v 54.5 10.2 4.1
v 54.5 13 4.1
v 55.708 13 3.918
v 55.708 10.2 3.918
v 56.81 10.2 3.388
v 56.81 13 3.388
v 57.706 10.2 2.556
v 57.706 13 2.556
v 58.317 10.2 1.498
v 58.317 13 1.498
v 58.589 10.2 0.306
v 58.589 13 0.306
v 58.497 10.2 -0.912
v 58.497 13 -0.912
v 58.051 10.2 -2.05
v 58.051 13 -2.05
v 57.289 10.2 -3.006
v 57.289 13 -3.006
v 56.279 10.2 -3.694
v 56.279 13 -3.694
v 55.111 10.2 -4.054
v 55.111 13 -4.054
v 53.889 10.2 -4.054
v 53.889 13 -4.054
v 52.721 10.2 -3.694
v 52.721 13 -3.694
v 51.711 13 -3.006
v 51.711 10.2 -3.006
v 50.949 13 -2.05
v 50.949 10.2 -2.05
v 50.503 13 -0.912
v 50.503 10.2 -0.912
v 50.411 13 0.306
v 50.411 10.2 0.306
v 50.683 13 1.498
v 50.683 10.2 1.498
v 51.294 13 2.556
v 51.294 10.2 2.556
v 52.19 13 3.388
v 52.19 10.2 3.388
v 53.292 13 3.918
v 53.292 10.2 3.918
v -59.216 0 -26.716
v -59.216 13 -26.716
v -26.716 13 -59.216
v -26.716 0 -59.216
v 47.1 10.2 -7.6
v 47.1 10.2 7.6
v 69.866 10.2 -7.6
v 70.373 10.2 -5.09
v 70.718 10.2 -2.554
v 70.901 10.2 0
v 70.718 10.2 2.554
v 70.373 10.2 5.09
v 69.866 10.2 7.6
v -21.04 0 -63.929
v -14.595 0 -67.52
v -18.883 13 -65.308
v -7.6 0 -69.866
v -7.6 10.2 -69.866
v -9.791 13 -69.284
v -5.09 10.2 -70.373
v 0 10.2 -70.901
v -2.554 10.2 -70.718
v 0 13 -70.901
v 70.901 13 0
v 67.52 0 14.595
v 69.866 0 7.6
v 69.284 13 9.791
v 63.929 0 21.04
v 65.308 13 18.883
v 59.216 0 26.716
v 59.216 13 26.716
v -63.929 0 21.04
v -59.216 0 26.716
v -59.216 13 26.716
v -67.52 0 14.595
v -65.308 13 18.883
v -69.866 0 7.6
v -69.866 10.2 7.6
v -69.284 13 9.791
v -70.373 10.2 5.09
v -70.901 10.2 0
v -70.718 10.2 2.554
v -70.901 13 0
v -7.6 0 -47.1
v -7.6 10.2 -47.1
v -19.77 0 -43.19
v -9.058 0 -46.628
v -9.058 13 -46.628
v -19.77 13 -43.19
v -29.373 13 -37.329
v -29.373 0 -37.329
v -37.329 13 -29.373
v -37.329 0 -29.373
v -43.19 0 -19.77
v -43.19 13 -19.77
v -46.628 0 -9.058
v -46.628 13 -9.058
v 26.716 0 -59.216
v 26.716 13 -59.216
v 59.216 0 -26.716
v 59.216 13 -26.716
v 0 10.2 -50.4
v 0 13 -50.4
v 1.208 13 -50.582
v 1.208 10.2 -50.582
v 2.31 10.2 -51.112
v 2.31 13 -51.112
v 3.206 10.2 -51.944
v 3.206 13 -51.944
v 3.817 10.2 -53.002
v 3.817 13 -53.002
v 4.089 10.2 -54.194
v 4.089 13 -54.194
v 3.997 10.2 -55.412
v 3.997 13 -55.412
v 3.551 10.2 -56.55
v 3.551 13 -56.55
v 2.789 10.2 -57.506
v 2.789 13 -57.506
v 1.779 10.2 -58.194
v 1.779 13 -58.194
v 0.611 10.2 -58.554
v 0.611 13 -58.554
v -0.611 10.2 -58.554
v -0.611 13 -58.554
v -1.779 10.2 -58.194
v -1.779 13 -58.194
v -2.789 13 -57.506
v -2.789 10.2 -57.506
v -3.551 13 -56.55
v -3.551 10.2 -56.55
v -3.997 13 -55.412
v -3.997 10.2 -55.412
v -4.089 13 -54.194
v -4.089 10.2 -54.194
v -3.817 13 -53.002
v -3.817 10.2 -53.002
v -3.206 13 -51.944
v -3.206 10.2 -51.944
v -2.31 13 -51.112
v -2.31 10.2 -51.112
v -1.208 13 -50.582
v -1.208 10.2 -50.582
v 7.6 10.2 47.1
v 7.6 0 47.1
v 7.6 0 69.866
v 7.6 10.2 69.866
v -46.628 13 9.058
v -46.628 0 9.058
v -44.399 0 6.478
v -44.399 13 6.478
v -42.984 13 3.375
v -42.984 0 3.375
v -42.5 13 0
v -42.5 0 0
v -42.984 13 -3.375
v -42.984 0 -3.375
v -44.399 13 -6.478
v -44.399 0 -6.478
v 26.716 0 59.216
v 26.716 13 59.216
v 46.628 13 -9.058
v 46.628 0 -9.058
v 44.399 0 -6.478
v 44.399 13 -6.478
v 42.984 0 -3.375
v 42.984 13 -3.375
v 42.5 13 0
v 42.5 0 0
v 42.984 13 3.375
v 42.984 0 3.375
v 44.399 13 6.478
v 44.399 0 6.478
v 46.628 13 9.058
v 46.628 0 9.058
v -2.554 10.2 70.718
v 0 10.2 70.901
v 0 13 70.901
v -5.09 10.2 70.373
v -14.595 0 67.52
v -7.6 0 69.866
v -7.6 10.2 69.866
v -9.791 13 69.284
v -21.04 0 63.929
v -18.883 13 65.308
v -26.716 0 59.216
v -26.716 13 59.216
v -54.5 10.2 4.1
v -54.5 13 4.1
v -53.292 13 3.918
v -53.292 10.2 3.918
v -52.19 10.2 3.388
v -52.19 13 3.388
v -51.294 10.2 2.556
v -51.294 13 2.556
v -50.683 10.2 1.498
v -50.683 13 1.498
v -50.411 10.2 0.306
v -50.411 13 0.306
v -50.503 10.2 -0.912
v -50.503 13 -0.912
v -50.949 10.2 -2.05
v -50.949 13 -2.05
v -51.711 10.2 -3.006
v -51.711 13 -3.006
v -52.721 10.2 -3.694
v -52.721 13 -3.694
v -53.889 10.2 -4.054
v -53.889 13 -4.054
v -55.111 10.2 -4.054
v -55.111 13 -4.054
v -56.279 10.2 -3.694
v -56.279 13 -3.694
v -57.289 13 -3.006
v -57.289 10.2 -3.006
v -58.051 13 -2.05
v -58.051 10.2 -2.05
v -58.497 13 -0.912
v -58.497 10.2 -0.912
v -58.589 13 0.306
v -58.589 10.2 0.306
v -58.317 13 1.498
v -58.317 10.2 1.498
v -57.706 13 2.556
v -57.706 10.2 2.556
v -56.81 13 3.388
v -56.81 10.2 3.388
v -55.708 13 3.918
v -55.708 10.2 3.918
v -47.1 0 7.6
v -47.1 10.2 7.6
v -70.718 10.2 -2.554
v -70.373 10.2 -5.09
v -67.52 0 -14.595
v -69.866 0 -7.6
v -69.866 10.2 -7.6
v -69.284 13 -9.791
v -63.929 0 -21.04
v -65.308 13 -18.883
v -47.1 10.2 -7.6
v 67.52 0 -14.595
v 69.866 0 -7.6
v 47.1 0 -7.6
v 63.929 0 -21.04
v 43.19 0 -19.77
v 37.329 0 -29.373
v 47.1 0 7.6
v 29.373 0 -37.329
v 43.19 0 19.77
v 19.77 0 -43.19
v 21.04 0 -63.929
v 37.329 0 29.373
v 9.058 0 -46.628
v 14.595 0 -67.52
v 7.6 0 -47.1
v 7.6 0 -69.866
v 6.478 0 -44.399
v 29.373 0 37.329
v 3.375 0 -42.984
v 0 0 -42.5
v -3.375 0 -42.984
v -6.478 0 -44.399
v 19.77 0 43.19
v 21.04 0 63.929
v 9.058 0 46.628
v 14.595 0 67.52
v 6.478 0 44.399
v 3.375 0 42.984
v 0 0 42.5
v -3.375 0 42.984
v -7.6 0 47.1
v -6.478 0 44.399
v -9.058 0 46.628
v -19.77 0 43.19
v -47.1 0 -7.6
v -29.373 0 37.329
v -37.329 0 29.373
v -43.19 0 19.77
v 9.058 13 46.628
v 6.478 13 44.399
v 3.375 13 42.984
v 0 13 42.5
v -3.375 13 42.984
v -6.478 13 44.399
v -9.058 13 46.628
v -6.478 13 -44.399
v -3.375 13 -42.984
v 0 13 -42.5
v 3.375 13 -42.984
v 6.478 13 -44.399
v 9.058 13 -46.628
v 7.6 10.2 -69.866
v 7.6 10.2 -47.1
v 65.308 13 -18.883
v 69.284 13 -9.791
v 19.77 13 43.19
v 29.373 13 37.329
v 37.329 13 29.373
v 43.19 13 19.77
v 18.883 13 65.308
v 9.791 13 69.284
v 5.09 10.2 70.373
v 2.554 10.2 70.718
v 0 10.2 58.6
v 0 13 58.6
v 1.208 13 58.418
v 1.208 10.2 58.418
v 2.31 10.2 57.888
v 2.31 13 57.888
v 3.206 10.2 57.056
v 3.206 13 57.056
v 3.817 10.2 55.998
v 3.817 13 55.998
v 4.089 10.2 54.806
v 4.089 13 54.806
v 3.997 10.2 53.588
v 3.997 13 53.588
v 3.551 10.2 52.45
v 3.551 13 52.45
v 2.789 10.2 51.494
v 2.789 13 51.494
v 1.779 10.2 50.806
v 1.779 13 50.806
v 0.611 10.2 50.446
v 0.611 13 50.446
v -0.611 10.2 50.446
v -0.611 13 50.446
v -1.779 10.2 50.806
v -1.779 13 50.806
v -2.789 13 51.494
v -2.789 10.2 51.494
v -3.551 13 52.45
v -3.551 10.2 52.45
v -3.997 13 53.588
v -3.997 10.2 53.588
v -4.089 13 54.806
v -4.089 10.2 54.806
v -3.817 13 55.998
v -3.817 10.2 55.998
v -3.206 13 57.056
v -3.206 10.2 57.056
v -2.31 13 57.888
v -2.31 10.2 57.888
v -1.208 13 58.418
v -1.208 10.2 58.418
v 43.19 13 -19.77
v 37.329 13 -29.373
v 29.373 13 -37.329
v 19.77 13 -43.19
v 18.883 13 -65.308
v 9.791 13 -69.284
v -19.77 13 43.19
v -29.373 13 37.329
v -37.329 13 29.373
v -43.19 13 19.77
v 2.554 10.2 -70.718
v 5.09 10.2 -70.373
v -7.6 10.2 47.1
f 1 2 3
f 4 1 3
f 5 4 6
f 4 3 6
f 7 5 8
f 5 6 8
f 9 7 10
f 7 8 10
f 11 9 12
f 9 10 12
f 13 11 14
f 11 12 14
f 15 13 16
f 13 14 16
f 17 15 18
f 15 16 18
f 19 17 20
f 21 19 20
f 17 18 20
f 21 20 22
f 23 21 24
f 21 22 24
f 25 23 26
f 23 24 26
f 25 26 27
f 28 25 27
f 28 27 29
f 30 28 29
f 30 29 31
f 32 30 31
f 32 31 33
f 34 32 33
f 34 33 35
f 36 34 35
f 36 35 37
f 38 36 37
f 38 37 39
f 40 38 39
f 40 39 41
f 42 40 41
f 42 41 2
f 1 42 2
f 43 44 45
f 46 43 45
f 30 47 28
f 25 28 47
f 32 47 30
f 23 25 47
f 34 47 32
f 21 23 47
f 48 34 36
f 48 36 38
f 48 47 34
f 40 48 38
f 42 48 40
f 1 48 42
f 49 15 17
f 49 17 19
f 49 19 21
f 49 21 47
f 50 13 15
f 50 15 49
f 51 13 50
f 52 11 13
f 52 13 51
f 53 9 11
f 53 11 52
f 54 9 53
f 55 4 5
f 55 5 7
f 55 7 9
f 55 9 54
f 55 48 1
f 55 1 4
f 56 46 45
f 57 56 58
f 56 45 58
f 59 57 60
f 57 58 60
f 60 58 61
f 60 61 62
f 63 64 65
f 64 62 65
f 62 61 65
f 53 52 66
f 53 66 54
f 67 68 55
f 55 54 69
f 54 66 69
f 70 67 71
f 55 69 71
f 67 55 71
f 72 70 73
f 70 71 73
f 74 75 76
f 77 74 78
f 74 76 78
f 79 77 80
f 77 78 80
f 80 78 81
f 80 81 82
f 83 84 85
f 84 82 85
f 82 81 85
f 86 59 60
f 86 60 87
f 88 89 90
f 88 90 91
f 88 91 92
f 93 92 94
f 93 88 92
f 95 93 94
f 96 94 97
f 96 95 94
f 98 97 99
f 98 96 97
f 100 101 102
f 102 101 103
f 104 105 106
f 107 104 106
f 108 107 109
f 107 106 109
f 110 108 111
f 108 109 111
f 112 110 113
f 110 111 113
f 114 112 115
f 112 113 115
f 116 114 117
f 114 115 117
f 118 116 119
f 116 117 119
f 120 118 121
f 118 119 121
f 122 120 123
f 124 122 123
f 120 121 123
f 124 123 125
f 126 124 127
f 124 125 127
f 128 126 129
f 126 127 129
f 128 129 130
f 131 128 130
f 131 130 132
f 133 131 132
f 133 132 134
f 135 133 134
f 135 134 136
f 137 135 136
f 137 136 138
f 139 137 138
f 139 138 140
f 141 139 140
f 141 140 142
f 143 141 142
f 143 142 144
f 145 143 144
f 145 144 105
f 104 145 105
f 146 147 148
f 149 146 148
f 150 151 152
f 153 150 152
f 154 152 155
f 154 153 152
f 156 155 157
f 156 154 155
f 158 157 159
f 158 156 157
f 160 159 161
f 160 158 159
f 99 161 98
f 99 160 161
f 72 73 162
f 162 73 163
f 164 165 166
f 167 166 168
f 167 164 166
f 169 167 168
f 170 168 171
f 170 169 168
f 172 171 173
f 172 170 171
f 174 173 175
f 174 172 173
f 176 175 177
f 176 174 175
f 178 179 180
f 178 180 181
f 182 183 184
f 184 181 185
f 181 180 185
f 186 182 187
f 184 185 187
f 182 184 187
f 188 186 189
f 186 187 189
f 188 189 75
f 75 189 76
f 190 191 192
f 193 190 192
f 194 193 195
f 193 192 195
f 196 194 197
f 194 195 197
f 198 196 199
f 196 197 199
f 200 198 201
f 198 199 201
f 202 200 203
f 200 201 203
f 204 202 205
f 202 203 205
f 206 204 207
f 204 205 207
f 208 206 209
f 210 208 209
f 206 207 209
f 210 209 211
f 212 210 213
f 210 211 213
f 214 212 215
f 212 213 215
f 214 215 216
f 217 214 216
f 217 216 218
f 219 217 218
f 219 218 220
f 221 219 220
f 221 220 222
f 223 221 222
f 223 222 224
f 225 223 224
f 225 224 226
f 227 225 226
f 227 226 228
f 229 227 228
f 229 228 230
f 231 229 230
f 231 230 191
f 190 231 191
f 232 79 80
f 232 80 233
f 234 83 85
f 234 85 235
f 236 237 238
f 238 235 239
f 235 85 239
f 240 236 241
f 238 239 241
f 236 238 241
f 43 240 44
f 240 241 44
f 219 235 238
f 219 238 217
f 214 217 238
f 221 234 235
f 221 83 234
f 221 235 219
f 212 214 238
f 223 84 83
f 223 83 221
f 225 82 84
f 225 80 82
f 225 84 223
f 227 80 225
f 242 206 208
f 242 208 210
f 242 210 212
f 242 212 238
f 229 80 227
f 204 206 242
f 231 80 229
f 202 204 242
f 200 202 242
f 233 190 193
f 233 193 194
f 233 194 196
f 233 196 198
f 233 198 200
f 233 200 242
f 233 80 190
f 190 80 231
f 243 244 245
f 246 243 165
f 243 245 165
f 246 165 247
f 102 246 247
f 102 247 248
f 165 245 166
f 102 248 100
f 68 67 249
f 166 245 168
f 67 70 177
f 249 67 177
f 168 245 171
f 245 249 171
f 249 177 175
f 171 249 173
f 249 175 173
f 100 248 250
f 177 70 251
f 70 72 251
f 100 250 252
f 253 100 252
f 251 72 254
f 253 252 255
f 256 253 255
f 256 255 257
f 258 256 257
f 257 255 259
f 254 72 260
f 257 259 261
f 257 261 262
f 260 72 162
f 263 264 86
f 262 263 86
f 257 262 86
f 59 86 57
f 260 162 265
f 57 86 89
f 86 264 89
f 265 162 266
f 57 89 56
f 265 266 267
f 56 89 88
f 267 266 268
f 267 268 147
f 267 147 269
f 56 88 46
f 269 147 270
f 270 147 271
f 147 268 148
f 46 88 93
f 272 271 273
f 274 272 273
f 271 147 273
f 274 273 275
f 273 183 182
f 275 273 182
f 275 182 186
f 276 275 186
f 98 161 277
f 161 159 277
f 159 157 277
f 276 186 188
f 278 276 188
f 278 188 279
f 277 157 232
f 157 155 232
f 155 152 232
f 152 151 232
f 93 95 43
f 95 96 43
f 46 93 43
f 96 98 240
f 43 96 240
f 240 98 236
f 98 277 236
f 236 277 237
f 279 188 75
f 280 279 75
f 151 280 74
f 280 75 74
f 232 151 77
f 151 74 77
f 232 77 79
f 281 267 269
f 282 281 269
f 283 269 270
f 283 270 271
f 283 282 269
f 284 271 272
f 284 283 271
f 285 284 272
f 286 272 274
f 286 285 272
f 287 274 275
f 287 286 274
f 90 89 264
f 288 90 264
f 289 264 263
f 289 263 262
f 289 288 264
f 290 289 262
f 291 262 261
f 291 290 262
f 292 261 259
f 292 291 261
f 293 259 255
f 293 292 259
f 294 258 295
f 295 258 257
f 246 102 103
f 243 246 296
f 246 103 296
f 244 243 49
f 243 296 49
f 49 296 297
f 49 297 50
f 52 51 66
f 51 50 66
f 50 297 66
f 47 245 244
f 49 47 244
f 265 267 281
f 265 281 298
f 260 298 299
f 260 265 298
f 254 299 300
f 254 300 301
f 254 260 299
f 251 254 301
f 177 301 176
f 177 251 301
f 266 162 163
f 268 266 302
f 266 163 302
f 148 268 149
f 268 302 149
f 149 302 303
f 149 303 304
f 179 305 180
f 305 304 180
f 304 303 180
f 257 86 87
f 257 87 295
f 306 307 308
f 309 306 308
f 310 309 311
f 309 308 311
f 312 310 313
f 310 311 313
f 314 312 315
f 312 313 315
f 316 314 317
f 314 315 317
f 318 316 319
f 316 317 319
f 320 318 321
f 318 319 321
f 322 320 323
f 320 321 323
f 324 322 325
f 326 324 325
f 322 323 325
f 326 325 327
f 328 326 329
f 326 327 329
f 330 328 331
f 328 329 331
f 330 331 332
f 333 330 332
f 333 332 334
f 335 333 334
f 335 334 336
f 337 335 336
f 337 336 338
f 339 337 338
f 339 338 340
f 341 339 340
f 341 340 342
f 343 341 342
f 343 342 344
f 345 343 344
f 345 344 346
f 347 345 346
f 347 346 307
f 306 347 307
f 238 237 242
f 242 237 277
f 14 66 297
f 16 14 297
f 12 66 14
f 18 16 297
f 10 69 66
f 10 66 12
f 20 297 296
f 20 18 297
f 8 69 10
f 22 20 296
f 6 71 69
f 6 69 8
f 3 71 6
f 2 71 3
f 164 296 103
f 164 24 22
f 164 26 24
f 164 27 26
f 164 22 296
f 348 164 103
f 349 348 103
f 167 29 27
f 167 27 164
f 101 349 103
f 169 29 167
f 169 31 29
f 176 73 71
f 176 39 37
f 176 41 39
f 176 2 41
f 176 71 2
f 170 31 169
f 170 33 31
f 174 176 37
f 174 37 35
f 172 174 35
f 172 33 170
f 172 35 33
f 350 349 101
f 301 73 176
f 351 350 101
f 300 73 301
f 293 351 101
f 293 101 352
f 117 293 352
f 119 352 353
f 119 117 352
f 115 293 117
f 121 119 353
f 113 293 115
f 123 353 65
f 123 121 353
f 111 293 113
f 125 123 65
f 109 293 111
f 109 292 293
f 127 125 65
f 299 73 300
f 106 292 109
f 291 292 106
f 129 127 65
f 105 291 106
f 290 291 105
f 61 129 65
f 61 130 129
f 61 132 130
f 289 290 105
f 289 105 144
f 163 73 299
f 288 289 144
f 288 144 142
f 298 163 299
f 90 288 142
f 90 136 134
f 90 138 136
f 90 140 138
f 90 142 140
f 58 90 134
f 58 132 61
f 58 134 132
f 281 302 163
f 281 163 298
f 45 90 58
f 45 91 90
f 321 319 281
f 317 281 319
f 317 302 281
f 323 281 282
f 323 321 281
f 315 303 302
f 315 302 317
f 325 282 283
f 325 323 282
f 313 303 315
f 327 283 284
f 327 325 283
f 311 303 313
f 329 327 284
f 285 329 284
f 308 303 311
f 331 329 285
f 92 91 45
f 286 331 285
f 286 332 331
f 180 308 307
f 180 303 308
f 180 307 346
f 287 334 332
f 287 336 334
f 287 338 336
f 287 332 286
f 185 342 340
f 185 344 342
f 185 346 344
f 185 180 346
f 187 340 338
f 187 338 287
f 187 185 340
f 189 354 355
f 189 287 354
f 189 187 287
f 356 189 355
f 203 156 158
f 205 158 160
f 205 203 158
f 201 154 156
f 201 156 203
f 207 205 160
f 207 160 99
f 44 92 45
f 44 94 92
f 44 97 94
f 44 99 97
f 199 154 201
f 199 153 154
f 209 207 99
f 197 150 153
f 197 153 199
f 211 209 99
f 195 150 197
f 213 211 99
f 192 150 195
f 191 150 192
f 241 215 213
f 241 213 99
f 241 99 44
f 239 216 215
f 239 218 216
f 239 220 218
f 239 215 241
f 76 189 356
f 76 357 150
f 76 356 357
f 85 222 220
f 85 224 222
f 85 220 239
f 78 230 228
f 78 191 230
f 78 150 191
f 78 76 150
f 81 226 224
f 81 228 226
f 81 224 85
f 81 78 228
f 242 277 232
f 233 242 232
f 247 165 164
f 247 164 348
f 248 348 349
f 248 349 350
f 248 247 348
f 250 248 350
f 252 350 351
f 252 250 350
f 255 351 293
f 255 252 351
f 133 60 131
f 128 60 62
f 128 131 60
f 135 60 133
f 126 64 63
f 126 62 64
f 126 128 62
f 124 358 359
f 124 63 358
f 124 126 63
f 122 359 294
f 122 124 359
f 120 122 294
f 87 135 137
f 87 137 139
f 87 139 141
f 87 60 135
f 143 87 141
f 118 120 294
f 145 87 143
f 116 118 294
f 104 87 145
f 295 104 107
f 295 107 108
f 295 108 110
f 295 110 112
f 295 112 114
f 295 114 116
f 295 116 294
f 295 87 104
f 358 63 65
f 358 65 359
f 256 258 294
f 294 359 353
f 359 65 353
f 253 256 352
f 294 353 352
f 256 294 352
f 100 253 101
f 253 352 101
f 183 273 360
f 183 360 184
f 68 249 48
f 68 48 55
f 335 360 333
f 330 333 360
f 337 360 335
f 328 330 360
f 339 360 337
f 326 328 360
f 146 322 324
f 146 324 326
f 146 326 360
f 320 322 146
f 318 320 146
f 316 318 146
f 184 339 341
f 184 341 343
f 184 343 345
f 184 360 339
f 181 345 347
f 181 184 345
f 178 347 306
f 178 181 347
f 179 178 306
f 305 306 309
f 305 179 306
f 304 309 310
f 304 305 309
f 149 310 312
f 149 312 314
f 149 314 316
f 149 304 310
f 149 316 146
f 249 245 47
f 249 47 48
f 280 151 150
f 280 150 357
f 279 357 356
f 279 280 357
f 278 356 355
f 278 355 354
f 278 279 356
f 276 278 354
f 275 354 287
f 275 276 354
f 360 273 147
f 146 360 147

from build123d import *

# Parameters (mm, degrees)
SKETCH1_R           = 72.5
SKETCH1_R_2         = 47.5
BOSS_EXTRUDE1_DEPTH = 13
SKETCH2_R           = 4.1
CUT_EXTRUDE1_DEPTH  = 104.351342517
SKETCH8_R           = 12
SKETCH8_R_2         = 4.1
BOSS_EXTRUDE4_DEPTH = 13
SKETCH3_W           = 15.2
SKETCH3_H           = 40
SKETCH3_W_2         = 40
SKETCH3_H_2         = 15.2
CUT_EXTRUDE2_DEPTH  = 10.2
BOSS_EXTRUDE2_DEPTH = 13
FILLET1_R           = 30
SKETCH7_OUTSIDE_W   = 188.094
SKETCH7_OUTSIDE_H   = 188.094
CUT_EXTRUDE4_DEPTH  = 104.351342517
FILLET3_R           = 40


with BuildPart() as part:
    # Sketch1 → Boss-Extrude1 (new body)
    with BuildSketch(Plane(origin=(0, 0, 0), x_dir=(1, 0, 0), z_dir=(0, 1, 0))):
        with Locations(Location((0, 0, 0), (0, 0, 90))):
            Circle(SKETCH1_R)
        with Locations(Location((0, 0, 0), (0, 0, 90))):
            Circle(SKETCH1_R_2, mode=Mode.SUBTRACT)
    extrude(amount=BOSS_EXTRUDE1_DEPTH)

    # Sketch2 → Cut-Extrude1 (cut, through all)
    with BuildSketch(Plane(origin=(0, 13, 0), x_dir=(1, 0, 0), z_dir=(0, 1, 0))):
        with Locations(Location((0, 54.5, 0), (0, 0, 270))):
            Circle(SKETCH2_R)
        with Locations(Location((54.5, 0, 0), (0, 0, 270))):
            Circle(SKETCH2_R)
        with Locations(Location((0, -54.5, 0), (0, 0, 270))):
            Circle(SKETCH2_R)
        with Locations(Location((-54.5, 0, 0), (0, 0, 270))):
            Circle(SKETCH2_R)
    extrude(amount=-CUT_EXTRUDE1_DEPTH, mode=Mode.SUBTRACT)

    # Sketch8 → Boss-Extrude4 (add)
    # profile 1 of 4: a face of its own
    with BuildSketch(Plane(origin=(0, 13, 0), x_dir=(1, 0, 0), z_dir=(0, 1, 0))):
        with Locations((54.5, 0)):
            Circle(SKETCH8_R)
        with Locations(Location((54.5, 0, 0), (0, 0, 270))):
            Circle(SKETCH8_R_2, mode=Mode.SUBTRACT)
    # profile 2 of 4: a face of its own
    with BuildSketch(Plane(origin=(0, 13, 0), x_dir=(1, 0, 0), z_dir=(0, 1, 0))):
        with Locations((0, -54.5)):
            Circle(SKETCH8_R)
        with Locations(Location((0, -54.5, 0), (0, 0, 270))):
            Circle(SKETCH8_R_2, mode=Mode.SUBTRACT)
    # profile 3 of 4: a face of its own
    with BuildSketch(Plane(origin=(0, 13, 0), x_dir=(1, 0, 0), z_dir=(0, 1, 0))):
        with Locations((-54.5, 0)):
            Circle(SKETCH8_R)
        with Locations(Location((-54.5, 0, 0), (0, 0, 270))):
            Circle(SKETCH8_R_2, mode=Mode.SUBTRACT)
    # profile 4 of 4: a face of its own
    with BuildSketch(Plane(origin=(0, 13, 0), x_dir=(1, 0, 0), z_dir=(0, 1, 0))):
        with Locations((0, 54.5)):
            Circle(SKETCH8_R)
        with Locations(Location((0, 54.5, 0), (0, 0, 270))):
            Circle(SKETCH8_R_2, mode=Mode.SUBTRACT)
    extrude(amount=-BOSS_EXTRUDE4_DEPTH)

    # Sketch3 → Cut-Extrude2 (cut)
    with BuildSketch(Plane.XZ):
        with Locations((0, 67.1)):
            Rectangle(SKETCH3_W, SKETCH3_H)
        with Locations((67.1, 0)):
            Rectangle(SKETCH3_W_2, SKETCH3_H_2)
        with Locations((0, -67.1)):
            Rectangle(SKETCH3_W, SKETCH3_H)
        with Locations((-67.1, 0)):
            Rectangle(SKETCH3_W_2, SKETCH3_H_2)
    extrude(amount=-CUT_EXTRUDE2_DEPTH, mode=Mode.SUBTRACT)

    # Sketch4 → Boss-Extrude2 (add)
    with BuildSketch(Plane(origin=(0, 13, 0), x_dir=(1, 0, 0), z_dir=(0, 1, 0))):
        Polygon((-38.890872965, -63.639610307), (-63.639610307, -38.890872965), (-62.123740526, -37.375003185), (-37.375003185, -62.123740526), align=None)
    extrude(amount=-BOSS_EXTRUDE2_DEPTH)

    # Fillet1
    # the kernel refuses this fillet: 30 mm, written as the material it adds along each edge
    with BuildSketch(Plane(origin=(-62.123740526, 13, 37.375003185), x_dir=(-0.46376459281913895, 0, -0.8859584654188357), z_dir=(0, -1, 0))) as fillet1_piece_1:
        with BuildLine():
            CenterArc((10.383918848, -29.947140809), FILLET1_R, 93.401739444, 18.157539937)
            Line((-0.639990933, -2.046004396), (-0.860469129, -1.487981668))
            ThreePointArc((-0.860469129, -1.487981668), (-0.892634463, -0.843880508), (-0.572638996, 0.17912169))
            Line((-0.572638996, 0.17912169), (0.035602007, 0.598942816))
            ThreePointArc((0.035602007, 0.598942816), (4.301909237, 0.472256956), (8.568216466, 0.598942816))
            Line((8.568216466, 0.598942816), (8.603818474, 0))
        make_face()
    extrude(amount=13)
    with BuildSketch(Plane(origin=(-37.375003185, 13, 62.123740526), x_dir=(0.8859584654188359, 0, 0.4637645928191383), z_dir=(0, -1, 0))) as fillet1_piece_2:
        with BuildLine():
            CenterArc((10.383918848, 29.947140809), FILLET1_R, 248.440720619, 18.157539937)
            Line((-0.639990933, 2.046004396), (-0.860469129, 1.487981668))
            ThreePointArc((-0.860469129, 1.487981668), (-0.892634463, 0.843880508), (-0.572638996, -0.17912169))
            Line((-0.572638996, -0.17912169), (0.035602007, -0.598942816))
            ThreePointArc((0.035602007, -0.598942816), (4.301909237, -0.472256956), (8.568216466, -0.598942816))
            Line((8.568216466, -0.598942816), (8.603818474, 0))
        make_face()
    extrude(amount=13)

    # Sketch7 outside → Cut-Extrude4 (cut, through all)
    with BuildSketch(Plane(origin=(0, 13, 0), x_dir=(1, 0, 0), z_dir=(0, 1, 0))):
        Rectangle(SKETCH7_OUTSIDE_W, SKETCH7_OUTSIDE_H)
        Polygon((70.931304796, -15), (15, -70.931304796), (-15, -70.931304796), (-70.931304796, -15), (-70.931304796, 15), (-15, 70.931304796), (15, 70.931304796), (70.931304796, 15), align=None, mode=Mode.SUBTRACT)
    extrude(amount=-CUT_EXTRUDE4_DEPTH, mode=Mode.SUBTRACT)

    # Fillet3
    # the kernel refuses this fillet: 40 mm, written as the material it takes off along each edge
    with BuildSketch(Plane(origin=(15, 54.421356237, 70.931304796), x_dir=(-1, 0, 0), z_dir=(0, -1, 0)), Plane(origin=(70.931304796, 54.421356237, 15), x_dir=(-0.7071067811865474, 0, 0.7071067811865476), z_dir=(0, -1, 0))) as fillet3_piece_1:
        with BuildLine():
            CenterArc((FILLET3_R * 0.414213562373, FILLET3_R), FILLET3_R, 225, 45)
            Line((-FILLET3_R * 0.292893218813, FILLET3_R * 0.292893218813), (0, 0))
            Line((0, 0), (FILLET3_R * 0.414213562373, 0))
        make_face()
    extrude(amount=95.842712475, mode=Mode.SUBTRACT)
    with BuildSketch(Plane(origin=(-15, 54.421356237, 70.931304796), x_dir=(1, 0, 0), z_dir=(0, -1, 0)), Plane(origin=(-70.931304796, 54.421356237, 15), x_dir=(0.7071067811865476, 0, 0.7071067811865476), z_dir=(0, -1, 0)), Plane(origin=(-70.931304796, 54.421356237, -15), x_dir=(0, 0, 1), z_dir=(0, -1, 0)), Plane(origin=(-15, 54.421356237, -70.931304796), x_dir=(-0.7071067811865476, 0, 0.7071067811865476), z_dir=(0, -1, 0)), Plane(origin=(15, 54.421356237, -70.931304796), x_dir=(-1, 0, 0), z_dir=(0, -1, 0)), Plane(origin=(70.931304796, 54.421356237, -15), x_dir=(-0.7071067811865476, 0, -0.7071067811865476), z_dir=(0, -1, 0))) as fillet3_piece_2:
        with BuildLine():
            CenterArc((FILLET3_R * 0.414213562373, -FILLET3_R), FILLET3_R, 90, 45)
            Line((-FILLET3_R * 0.292893218813, -FILLET3_R * 0.292893218813), (0, 0))
            Line((0, 0), (FILLET3_R * 0.414213562373, 0))
        make_face()
    extrude(amount=95.842712475, mode=Mode.SUBTRACT)


solid = part.part
